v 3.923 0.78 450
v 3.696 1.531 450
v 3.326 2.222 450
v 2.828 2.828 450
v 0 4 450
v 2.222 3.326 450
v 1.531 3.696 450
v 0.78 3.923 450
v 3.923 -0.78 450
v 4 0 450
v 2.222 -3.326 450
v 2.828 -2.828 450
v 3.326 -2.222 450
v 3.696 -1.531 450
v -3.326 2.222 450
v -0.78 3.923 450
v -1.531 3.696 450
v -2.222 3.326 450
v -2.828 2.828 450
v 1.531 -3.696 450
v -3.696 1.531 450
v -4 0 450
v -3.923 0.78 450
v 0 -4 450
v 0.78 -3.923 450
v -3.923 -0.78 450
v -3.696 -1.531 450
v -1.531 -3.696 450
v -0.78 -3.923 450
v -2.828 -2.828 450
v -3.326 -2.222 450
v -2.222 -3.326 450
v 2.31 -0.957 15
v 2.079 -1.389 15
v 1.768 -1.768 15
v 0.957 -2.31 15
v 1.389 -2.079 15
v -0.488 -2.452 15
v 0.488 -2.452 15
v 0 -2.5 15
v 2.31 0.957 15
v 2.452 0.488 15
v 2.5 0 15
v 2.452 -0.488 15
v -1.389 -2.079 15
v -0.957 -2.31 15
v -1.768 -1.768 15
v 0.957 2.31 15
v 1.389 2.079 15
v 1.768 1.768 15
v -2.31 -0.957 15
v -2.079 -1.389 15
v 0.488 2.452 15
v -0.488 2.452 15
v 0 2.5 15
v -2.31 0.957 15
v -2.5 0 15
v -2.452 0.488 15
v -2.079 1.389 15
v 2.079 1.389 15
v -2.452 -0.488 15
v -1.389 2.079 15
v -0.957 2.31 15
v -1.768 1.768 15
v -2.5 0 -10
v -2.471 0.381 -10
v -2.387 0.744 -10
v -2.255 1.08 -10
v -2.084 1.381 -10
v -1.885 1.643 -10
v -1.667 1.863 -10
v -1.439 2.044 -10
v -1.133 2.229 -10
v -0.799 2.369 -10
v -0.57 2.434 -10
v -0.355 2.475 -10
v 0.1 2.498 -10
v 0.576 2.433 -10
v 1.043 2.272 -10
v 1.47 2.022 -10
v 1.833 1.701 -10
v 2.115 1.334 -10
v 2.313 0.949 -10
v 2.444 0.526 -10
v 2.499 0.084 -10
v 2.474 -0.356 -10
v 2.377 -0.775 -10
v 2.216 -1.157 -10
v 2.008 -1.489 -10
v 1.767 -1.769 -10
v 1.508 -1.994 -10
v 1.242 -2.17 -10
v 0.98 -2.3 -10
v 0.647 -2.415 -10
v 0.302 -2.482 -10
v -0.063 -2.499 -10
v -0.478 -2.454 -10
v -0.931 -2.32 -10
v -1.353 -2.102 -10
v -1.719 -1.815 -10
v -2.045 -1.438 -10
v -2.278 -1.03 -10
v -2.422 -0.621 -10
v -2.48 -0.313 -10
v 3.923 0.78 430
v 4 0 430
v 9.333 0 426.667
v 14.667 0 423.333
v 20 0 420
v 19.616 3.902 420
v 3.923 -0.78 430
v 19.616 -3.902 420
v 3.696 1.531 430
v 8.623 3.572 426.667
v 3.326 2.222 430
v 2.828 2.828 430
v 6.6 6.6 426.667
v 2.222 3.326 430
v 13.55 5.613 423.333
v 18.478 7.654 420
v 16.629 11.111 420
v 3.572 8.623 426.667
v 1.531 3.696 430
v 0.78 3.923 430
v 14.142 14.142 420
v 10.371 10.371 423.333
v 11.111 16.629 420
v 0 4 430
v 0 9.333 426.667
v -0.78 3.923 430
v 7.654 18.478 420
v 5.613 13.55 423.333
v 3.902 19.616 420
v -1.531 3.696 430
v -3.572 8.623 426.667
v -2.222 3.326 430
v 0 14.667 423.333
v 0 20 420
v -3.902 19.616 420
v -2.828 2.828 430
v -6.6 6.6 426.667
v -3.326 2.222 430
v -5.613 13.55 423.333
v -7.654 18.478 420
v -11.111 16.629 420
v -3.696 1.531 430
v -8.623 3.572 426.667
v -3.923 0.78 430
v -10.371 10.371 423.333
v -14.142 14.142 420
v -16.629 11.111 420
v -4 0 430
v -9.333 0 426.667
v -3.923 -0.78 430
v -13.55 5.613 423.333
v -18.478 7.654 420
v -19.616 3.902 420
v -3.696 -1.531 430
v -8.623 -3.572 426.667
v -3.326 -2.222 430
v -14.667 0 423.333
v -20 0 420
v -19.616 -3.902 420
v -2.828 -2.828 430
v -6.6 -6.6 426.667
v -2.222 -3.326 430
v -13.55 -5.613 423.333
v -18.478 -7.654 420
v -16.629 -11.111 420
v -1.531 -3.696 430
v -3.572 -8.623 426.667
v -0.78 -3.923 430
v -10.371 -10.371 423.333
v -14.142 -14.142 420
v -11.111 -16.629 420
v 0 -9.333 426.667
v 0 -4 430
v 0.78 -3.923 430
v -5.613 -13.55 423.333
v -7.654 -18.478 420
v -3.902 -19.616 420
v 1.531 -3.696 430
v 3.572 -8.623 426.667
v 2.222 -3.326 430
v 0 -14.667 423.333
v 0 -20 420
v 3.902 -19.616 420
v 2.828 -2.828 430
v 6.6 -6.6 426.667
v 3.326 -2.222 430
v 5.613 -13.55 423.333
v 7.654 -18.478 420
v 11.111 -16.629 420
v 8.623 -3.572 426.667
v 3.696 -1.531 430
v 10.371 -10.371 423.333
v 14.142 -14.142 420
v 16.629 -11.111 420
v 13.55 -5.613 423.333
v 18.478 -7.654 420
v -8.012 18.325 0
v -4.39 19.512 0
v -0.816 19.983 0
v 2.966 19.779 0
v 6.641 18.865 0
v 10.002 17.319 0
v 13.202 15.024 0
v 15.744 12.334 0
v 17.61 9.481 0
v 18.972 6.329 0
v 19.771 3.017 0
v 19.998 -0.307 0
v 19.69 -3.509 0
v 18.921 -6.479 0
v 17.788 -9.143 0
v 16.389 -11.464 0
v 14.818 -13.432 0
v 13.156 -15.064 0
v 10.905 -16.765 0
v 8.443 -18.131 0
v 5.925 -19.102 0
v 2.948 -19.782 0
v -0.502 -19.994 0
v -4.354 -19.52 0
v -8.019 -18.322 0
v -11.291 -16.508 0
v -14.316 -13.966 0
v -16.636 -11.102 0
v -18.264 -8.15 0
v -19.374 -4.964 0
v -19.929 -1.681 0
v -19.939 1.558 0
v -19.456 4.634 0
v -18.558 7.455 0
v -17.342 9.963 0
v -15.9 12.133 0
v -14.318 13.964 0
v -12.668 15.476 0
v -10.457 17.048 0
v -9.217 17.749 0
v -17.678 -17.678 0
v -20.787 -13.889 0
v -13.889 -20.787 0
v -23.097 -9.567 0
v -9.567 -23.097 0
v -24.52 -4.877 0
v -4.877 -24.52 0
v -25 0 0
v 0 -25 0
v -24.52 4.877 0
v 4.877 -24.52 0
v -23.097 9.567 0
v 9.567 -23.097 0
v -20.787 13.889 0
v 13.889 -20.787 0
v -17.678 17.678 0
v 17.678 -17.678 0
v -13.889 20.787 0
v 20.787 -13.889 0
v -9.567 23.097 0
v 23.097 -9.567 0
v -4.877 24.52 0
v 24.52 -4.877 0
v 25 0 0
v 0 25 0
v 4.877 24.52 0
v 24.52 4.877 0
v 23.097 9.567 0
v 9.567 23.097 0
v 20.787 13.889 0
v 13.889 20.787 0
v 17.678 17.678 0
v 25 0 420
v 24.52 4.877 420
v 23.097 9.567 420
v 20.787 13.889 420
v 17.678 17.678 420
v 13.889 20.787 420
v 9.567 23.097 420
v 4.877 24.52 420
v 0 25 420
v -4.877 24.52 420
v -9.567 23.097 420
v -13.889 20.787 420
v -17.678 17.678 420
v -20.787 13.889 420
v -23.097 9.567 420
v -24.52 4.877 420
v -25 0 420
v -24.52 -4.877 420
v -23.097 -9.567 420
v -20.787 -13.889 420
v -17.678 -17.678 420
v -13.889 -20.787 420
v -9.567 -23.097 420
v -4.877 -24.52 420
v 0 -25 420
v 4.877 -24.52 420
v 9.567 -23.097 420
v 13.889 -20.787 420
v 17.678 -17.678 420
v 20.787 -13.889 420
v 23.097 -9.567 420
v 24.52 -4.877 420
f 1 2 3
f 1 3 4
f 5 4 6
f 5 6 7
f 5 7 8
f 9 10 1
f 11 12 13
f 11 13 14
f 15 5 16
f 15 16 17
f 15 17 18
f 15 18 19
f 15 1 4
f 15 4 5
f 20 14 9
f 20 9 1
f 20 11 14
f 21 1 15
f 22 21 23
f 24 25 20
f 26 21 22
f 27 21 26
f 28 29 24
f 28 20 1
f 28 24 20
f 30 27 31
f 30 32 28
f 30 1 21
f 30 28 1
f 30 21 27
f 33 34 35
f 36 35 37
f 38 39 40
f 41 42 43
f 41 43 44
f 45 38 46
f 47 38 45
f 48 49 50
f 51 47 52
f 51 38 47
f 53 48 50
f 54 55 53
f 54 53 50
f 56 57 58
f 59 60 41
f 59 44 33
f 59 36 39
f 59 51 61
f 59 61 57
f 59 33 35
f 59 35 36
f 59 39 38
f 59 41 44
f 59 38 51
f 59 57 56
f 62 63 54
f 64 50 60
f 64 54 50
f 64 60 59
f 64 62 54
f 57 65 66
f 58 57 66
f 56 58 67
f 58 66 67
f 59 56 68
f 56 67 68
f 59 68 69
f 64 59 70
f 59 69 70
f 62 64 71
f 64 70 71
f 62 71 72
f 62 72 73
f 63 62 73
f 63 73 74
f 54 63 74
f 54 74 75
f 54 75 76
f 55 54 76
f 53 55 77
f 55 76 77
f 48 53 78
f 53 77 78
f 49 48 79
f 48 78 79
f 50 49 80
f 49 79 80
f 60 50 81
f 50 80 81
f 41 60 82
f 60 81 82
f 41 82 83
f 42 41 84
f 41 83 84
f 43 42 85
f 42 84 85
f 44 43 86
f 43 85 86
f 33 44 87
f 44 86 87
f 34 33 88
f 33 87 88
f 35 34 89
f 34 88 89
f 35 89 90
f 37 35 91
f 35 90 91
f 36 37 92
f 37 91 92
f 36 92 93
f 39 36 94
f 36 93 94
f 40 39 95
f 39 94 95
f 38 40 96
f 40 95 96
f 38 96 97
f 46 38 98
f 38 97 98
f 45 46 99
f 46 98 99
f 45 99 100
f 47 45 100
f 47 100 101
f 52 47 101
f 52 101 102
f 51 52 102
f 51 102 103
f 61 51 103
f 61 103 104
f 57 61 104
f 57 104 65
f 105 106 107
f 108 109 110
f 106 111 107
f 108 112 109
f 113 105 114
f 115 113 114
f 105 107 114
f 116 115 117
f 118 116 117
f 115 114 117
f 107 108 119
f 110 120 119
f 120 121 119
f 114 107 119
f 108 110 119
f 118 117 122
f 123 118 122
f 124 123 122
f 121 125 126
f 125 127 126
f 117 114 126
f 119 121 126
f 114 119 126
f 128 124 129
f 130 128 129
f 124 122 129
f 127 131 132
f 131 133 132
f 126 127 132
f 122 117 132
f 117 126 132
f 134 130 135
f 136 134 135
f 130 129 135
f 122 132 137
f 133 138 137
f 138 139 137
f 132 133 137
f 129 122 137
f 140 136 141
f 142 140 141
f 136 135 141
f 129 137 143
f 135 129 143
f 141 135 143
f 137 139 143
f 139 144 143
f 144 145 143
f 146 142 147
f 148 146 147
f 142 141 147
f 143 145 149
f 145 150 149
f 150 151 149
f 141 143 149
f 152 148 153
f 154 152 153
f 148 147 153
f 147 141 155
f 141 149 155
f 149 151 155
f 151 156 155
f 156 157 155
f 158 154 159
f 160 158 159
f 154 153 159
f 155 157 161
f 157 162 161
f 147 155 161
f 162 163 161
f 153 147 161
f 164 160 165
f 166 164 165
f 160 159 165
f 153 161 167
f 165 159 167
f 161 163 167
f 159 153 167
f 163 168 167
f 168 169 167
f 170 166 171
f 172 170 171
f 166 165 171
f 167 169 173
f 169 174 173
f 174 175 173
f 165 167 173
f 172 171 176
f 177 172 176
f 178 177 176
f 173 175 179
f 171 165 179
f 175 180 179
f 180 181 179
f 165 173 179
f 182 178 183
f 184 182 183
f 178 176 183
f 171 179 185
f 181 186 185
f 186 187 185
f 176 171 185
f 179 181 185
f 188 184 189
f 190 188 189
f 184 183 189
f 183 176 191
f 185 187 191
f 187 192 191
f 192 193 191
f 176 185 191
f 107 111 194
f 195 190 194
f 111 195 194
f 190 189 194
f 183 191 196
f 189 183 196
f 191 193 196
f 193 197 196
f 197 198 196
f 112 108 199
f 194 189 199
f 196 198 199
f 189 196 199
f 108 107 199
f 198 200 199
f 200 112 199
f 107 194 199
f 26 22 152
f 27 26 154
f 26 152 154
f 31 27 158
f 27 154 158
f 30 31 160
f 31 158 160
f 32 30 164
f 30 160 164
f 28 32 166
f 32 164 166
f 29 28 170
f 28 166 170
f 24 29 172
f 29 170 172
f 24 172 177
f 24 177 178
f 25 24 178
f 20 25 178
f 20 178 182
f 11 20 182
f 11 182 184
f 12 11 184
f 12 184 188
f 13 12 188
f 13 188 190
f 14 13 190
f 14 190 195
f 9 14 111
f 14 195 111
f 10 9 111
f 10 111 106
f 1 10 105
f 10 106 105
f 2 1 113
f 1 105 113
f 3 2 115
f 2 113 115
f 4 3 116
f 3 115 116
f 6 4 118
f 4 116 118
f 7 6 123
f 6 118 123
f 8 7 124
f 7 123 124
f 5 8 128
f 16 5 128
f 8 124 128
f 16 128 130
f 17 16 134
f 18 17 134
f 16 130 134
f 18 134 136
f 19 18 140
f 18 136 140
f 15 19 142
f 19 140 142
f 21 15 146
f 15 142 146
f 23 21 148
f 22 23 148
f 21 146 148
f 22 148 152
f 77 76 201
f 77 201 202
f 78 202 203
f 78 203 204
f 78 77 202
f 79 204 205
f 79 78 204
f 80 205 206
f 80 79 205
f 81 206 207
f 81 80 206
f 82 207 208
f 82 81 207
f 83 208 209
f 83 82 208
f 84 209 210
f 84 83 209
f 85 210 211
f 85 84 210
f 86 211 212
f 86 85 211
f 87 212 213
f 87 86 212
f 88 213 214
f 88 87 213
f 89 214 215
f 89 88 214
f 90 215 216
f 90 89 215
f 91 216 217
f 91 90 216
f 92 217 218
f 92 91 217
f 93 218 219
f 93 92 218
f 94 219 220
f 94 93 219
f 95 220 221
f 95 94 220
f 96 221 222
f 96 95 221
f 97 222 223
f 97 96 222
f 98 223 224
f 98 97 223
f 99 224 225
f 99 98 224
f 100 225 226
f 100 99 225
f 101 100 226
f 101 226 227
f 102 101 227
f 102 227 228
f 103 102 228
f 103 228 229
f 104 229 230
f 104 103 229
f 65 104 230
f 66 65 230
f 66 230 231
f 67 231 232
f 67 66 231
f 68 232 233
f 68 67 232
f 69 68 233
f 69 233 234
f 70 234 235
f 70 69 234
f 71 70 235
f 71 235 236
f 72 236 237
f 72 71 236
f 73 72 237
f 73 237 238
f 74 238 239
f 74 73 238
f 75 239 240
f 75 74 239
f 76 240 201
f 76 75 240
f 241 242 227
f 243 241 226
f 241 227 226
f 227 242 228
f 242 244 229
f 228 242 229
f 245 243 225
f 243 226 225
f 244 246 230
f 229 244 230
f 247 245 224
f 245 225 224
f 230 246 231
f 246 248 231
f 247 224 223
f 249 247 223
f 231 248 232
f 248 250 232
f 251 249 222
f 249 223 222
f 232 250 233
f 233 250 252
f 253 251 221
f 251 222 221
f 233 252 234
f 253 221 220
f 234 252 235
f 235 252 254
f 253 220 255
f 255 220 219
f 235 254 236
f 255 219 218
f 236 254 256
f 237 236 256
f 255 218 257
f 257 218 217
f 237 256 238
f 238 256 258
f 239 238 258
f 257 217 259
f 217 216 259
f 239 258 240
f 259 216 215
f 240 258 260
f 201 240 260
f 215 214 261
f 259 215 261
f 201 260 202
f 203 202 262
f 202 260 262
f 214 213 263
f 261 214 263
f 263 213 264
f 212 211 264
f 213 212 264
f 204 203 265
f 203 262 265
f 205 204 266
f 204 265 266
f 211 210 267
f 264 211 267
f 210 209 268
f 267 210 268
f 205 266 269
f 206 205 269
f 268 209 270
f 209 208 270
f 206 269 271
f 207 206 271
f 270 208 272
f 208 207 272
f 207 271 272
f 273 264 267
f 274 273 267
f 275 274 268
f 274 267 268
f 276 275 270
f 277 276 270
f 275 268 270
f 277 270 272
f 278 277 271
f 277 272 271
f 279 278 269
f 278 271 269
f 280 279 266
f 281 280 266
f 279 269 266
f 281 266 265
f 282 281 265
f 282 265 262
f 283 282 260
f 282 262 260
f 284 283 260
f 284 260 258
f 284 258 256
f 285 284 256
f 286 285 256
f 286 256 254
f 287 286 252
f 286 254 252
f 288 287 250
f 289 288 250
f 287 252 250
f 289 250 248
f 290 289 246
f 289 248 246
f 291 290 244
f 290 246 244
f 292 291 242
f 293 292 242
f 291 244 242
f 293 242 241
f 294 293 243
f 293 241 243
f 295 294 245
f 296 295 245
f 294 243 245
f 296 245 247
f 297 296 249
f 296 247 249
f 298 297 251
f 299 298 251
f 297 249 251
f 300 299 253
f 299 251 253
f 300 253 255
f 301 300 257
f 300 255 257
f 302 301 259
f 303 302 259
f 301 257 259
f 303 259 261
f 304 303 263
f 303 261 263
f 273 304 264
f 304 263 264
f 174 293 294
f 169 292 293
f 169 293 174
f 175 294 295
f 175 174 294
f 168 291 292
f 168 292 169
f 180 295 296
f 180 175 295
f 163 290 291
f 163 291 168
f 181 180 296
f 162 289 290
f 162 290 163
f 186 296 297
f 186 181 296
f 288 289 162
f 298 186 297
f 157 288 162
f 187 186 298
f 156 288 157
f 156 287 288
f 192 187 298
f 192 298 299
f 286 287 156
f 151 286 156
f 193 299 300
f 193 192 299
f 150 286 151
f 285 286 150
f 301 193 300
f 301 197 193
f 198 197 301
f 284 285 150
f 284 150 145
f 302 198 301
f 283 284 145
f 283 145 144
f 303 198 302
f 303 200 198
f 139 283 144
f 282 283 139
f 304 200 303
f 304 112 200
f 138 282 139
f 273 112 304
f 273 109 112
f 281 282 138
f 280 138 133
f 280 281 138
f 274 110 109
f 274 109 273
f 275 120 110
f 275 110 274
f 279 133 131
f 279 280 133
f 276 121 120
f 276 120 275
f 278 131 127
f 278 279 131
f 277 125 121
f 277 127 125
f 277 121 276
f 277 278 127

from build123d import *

# Parameters (mm, degrees)
SCHIZZO1_R                   = 25
ESTRUSIONE_ESTRUSIONE1_DEPTH = 420
SCHIZZO5_R                   = 4
SCHIZZO4_R                   = 20
SCHIZZO9_R                   = 4
ESTRUSIONE_ESTRUSIONE2_DEPTH = 20
SCHIZZO12_R                  = 2.5
TAGLIO_ESTRUSIONE2_DEPTH     = 25


with BuildPart() as part:
    # Schizzo1 → Estrusione-Estrusione1 (new body)
    with BuildSketch(Plane.XY):
        Circle(SCHIZZO1_R)
    extrude(amount=ESTRUSIONE_ESTRUSIONE1_DEPTH)

    # Schizzo5 → Loft2 section 0
    with BuildSketch(Plane.XY.offset(430)):
        Circle(SCHIZZO5_R)
    # Schizzo4 → Loft2 section 1
    with BuildSketch(Plane.XY.offset(420)):
        Circle(SCHIZZO4_R)
    loft()

    # Schizzo9 → Estrusione-Estrusione2 (add)
    with BuildSketch(Plane.XY.offset(430)):
        with Locations(Location((0, 0, 0), (0, 0, 180))):
            Circle(SCHIZZO9_R)
    extrude(amount=ESTRUSIONE_ESTRUSIONE2_DEPTH)

    # Loft3: read off the stored shape, not the designer's step
    # Loft3: loft between two sections, ruled curve by curve
    loft3_from = [
        Edge.make_bspline([(-8.012098274, 18.325017906, 0), (28.637937538, 34.349214454, 0), (44.662134086, -2.300821358, 0), (8.012098274, -18.325017906, 0), (-28.637937538, -34.349214454, 0), (-44.662134086, 2.300821358, 0), (-8.012098274, 18.325017906, 0)], [0, 0, 0, 0, 0.5, 0.5, 0.5, 1, 1, 1, 1], 3, [1, 0.333333333, 0.333333333, 1, 0.333333333, 0.333333333, 1]),
    ]
    loft3_to = [
        Edge.make_bspline([(-0.355363052, 2.474614536, -10), (4.59386602, 3.18534064, -10), (5.304592124, -1.763888432, -10), (0.355363052, -2.474614536, -10), (-4.59386602, -3.18534064, -10), (-5.304592124, 1.763888432, -10), (-0.355363052, 2.474614536, -10)], [0, 0, 0, 0, 0.5, 0.5, 0.5, 1, 1, 1, 1], 3, [1, 0.333333333, 0.333333333, 1, 0.333333333, 0.333333333, 1]),
    ]
    loft3 = Solid(Shell([*[Face.make_surface_from_curves(loft3_from[k], loft3_to[k]) for k in range(1)], Face(Wire(loft3_from)), Face(Wire(loft3_to))]))
    add(loft3)

    # Schizzo12 → Taglio-Estrusione2 (cut)
    with BuildSketch(Plane(origin=(0, 0, -10), x_dir=(-1, 0, 0), z_dir=(0, 0, -1))):
        Circle(SCHIZZO12_R)
    extrude(amount=-TAGLIO_ESTRUSIONE2_DEPTH, mode=Mode.SUBTRACT)


solid = part.part
